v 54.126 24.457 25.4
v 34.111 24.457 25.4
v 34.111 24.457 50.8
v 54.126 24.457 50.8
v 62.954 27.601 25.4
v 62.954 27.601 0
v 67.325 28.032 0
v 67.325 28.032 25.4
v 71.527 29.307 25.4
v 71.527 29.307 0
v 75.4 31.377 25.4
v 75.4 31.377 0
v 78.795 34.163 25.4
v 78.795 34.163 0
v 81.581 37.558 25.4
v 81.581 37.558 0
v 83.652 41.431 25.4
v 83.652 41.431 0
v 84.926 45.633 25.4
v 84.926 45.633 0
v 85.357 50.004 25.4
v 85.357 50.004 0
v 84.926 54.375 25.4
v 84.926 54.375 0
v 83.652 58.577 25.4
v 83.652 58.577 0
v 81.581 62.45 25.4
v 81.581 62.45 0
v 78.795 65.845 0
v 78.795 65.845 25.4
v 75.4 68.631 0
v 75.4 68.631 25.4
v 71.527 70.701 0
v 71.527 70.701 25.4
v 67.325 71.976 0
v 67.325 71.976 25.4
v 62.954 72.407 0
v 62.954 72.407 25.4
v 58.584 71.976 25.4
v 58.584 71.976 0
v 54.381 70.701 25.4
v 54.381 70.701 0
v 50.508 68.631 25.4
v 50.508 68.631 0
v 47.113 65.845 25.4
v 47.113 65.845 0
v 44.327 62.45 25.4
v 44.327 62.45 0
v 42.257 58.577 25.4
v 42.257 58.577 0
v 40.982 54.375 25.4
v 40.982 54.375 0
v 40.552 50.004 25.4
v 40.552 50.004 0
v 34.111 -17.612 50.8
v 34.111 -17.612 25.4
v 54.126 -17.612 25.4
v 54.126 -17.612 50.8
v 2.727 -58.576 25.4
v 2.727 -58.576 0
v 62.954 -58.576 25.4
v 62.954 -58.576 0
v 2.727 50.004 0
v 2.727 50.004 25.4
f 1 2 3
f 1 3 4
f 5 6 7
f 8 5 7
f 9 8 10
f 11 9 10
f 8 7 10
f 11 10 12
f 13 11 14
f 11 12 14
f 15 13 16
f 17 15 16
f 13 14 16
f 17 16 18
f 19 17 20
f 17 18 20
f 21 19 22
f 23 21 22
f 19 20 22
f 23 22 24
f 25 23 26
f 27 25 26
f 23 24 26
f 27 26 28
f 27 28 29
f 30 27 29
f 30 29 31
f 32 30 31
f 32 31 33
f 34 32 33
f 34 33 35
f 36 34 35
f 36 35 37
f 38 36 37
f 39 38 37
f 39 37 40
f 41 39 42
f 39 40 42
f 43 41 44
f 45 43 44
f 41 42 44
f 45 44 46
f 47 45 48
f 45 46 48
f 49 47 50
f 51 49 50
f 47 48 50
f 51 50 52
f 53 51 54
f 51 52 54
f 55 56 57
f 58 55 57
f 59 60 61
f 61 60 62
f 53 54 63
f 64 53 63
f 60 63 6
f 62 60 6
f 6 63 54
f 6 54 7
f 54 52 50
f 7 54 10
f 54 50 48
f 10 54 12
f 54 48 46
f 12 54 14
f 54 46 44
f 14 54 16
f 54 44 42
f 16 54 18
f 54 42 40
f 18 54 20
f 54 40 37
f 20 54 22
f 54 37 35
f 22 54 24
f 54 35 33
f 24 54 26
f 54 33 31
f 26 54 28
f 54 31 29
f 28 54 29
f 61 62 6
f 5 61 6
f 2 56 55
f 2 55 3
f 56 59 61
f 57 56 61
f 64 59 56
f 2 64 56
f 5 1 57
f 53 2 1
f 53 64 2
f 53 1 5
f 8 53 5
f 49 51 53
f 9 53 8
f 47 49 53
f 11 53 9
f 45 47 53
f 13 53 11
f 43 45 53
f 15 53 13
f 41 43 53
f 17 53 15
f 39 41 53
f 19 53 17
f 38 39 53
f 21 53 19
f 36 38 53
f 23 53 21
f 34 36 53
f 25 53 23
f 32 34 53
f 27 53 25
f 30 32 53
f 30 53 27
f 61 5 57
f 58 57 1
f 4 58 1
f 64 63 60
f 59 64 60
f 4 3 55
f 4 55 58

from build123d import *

# Parameters (mm, degrees)
F1_DEPTH = 25.4
F2_W     = 20.0148001313
F2_H     = 42.0691836625
F3_DEPTH = 25.4


with BuildPart() as f1:
    # F0 (on Top) → F1 (new body)
    with BuildSketch(Plane.XY):
        with BuildLine():
            Line((2.726720646, 50.0040240586), (2.726720646, -58.5763193667))
            Line((2.726720646, -58.5763193667), (62.9542395473, -58.5763193667))
            Line((62.9542395473, -58.5763193667), (62.9542395473, 27.6013473304))
            ThreePointArc((62.9542395473, 27.6013473304), (47.113154916, 34.1629394274), (40.5515628191, 50.0040240586))
            Line((40.5515628191, 50.0040240586), (2.726720646, 50.0040240586))
        make_face()
        with BuildLine():
            ThreePointArc((40.5515628191, 50.0040240586), (47.113154916, 34.1629394274), (62.9542395473, 27.6013473304))
            Line((62.9542395473, 27.6013473304), (62.9542395473, 50.0040240586))
            Line((62.9542395473, 50.0040240586), (40.5515628191, 50.0040240586))
        make_face()
        with BuildLine():
            Line((62.9542395473, 50.0040240586), (62.9542395473, 27.6013473304))
            ThreePointArc((62.9542395473, 27.6013473304), (78.7953241785, 34.1629394274), (85.3569162754, 50.0040240586))
            ThreePointArc((85.3569162754, 50.0040240586), (62.9542395473, 72.4067007867), (40.5515628191, 50.0040240586))
            Line((40.5515628191, 50.0040240586), (62.9542395473, 50.0040240586))
        make_face()
    extrude(amount=F1_DEPTH)

    # F2 (on face) → F3 (join)
    with BuildSketch(Plane.XY.offset(25.4)):
        with Locations((44.1186800599, 3.4223971888)):
            Rectangle(F2_W, F2_H)
    extrude(amount=F3_DEPTH)


solid = f1.part
